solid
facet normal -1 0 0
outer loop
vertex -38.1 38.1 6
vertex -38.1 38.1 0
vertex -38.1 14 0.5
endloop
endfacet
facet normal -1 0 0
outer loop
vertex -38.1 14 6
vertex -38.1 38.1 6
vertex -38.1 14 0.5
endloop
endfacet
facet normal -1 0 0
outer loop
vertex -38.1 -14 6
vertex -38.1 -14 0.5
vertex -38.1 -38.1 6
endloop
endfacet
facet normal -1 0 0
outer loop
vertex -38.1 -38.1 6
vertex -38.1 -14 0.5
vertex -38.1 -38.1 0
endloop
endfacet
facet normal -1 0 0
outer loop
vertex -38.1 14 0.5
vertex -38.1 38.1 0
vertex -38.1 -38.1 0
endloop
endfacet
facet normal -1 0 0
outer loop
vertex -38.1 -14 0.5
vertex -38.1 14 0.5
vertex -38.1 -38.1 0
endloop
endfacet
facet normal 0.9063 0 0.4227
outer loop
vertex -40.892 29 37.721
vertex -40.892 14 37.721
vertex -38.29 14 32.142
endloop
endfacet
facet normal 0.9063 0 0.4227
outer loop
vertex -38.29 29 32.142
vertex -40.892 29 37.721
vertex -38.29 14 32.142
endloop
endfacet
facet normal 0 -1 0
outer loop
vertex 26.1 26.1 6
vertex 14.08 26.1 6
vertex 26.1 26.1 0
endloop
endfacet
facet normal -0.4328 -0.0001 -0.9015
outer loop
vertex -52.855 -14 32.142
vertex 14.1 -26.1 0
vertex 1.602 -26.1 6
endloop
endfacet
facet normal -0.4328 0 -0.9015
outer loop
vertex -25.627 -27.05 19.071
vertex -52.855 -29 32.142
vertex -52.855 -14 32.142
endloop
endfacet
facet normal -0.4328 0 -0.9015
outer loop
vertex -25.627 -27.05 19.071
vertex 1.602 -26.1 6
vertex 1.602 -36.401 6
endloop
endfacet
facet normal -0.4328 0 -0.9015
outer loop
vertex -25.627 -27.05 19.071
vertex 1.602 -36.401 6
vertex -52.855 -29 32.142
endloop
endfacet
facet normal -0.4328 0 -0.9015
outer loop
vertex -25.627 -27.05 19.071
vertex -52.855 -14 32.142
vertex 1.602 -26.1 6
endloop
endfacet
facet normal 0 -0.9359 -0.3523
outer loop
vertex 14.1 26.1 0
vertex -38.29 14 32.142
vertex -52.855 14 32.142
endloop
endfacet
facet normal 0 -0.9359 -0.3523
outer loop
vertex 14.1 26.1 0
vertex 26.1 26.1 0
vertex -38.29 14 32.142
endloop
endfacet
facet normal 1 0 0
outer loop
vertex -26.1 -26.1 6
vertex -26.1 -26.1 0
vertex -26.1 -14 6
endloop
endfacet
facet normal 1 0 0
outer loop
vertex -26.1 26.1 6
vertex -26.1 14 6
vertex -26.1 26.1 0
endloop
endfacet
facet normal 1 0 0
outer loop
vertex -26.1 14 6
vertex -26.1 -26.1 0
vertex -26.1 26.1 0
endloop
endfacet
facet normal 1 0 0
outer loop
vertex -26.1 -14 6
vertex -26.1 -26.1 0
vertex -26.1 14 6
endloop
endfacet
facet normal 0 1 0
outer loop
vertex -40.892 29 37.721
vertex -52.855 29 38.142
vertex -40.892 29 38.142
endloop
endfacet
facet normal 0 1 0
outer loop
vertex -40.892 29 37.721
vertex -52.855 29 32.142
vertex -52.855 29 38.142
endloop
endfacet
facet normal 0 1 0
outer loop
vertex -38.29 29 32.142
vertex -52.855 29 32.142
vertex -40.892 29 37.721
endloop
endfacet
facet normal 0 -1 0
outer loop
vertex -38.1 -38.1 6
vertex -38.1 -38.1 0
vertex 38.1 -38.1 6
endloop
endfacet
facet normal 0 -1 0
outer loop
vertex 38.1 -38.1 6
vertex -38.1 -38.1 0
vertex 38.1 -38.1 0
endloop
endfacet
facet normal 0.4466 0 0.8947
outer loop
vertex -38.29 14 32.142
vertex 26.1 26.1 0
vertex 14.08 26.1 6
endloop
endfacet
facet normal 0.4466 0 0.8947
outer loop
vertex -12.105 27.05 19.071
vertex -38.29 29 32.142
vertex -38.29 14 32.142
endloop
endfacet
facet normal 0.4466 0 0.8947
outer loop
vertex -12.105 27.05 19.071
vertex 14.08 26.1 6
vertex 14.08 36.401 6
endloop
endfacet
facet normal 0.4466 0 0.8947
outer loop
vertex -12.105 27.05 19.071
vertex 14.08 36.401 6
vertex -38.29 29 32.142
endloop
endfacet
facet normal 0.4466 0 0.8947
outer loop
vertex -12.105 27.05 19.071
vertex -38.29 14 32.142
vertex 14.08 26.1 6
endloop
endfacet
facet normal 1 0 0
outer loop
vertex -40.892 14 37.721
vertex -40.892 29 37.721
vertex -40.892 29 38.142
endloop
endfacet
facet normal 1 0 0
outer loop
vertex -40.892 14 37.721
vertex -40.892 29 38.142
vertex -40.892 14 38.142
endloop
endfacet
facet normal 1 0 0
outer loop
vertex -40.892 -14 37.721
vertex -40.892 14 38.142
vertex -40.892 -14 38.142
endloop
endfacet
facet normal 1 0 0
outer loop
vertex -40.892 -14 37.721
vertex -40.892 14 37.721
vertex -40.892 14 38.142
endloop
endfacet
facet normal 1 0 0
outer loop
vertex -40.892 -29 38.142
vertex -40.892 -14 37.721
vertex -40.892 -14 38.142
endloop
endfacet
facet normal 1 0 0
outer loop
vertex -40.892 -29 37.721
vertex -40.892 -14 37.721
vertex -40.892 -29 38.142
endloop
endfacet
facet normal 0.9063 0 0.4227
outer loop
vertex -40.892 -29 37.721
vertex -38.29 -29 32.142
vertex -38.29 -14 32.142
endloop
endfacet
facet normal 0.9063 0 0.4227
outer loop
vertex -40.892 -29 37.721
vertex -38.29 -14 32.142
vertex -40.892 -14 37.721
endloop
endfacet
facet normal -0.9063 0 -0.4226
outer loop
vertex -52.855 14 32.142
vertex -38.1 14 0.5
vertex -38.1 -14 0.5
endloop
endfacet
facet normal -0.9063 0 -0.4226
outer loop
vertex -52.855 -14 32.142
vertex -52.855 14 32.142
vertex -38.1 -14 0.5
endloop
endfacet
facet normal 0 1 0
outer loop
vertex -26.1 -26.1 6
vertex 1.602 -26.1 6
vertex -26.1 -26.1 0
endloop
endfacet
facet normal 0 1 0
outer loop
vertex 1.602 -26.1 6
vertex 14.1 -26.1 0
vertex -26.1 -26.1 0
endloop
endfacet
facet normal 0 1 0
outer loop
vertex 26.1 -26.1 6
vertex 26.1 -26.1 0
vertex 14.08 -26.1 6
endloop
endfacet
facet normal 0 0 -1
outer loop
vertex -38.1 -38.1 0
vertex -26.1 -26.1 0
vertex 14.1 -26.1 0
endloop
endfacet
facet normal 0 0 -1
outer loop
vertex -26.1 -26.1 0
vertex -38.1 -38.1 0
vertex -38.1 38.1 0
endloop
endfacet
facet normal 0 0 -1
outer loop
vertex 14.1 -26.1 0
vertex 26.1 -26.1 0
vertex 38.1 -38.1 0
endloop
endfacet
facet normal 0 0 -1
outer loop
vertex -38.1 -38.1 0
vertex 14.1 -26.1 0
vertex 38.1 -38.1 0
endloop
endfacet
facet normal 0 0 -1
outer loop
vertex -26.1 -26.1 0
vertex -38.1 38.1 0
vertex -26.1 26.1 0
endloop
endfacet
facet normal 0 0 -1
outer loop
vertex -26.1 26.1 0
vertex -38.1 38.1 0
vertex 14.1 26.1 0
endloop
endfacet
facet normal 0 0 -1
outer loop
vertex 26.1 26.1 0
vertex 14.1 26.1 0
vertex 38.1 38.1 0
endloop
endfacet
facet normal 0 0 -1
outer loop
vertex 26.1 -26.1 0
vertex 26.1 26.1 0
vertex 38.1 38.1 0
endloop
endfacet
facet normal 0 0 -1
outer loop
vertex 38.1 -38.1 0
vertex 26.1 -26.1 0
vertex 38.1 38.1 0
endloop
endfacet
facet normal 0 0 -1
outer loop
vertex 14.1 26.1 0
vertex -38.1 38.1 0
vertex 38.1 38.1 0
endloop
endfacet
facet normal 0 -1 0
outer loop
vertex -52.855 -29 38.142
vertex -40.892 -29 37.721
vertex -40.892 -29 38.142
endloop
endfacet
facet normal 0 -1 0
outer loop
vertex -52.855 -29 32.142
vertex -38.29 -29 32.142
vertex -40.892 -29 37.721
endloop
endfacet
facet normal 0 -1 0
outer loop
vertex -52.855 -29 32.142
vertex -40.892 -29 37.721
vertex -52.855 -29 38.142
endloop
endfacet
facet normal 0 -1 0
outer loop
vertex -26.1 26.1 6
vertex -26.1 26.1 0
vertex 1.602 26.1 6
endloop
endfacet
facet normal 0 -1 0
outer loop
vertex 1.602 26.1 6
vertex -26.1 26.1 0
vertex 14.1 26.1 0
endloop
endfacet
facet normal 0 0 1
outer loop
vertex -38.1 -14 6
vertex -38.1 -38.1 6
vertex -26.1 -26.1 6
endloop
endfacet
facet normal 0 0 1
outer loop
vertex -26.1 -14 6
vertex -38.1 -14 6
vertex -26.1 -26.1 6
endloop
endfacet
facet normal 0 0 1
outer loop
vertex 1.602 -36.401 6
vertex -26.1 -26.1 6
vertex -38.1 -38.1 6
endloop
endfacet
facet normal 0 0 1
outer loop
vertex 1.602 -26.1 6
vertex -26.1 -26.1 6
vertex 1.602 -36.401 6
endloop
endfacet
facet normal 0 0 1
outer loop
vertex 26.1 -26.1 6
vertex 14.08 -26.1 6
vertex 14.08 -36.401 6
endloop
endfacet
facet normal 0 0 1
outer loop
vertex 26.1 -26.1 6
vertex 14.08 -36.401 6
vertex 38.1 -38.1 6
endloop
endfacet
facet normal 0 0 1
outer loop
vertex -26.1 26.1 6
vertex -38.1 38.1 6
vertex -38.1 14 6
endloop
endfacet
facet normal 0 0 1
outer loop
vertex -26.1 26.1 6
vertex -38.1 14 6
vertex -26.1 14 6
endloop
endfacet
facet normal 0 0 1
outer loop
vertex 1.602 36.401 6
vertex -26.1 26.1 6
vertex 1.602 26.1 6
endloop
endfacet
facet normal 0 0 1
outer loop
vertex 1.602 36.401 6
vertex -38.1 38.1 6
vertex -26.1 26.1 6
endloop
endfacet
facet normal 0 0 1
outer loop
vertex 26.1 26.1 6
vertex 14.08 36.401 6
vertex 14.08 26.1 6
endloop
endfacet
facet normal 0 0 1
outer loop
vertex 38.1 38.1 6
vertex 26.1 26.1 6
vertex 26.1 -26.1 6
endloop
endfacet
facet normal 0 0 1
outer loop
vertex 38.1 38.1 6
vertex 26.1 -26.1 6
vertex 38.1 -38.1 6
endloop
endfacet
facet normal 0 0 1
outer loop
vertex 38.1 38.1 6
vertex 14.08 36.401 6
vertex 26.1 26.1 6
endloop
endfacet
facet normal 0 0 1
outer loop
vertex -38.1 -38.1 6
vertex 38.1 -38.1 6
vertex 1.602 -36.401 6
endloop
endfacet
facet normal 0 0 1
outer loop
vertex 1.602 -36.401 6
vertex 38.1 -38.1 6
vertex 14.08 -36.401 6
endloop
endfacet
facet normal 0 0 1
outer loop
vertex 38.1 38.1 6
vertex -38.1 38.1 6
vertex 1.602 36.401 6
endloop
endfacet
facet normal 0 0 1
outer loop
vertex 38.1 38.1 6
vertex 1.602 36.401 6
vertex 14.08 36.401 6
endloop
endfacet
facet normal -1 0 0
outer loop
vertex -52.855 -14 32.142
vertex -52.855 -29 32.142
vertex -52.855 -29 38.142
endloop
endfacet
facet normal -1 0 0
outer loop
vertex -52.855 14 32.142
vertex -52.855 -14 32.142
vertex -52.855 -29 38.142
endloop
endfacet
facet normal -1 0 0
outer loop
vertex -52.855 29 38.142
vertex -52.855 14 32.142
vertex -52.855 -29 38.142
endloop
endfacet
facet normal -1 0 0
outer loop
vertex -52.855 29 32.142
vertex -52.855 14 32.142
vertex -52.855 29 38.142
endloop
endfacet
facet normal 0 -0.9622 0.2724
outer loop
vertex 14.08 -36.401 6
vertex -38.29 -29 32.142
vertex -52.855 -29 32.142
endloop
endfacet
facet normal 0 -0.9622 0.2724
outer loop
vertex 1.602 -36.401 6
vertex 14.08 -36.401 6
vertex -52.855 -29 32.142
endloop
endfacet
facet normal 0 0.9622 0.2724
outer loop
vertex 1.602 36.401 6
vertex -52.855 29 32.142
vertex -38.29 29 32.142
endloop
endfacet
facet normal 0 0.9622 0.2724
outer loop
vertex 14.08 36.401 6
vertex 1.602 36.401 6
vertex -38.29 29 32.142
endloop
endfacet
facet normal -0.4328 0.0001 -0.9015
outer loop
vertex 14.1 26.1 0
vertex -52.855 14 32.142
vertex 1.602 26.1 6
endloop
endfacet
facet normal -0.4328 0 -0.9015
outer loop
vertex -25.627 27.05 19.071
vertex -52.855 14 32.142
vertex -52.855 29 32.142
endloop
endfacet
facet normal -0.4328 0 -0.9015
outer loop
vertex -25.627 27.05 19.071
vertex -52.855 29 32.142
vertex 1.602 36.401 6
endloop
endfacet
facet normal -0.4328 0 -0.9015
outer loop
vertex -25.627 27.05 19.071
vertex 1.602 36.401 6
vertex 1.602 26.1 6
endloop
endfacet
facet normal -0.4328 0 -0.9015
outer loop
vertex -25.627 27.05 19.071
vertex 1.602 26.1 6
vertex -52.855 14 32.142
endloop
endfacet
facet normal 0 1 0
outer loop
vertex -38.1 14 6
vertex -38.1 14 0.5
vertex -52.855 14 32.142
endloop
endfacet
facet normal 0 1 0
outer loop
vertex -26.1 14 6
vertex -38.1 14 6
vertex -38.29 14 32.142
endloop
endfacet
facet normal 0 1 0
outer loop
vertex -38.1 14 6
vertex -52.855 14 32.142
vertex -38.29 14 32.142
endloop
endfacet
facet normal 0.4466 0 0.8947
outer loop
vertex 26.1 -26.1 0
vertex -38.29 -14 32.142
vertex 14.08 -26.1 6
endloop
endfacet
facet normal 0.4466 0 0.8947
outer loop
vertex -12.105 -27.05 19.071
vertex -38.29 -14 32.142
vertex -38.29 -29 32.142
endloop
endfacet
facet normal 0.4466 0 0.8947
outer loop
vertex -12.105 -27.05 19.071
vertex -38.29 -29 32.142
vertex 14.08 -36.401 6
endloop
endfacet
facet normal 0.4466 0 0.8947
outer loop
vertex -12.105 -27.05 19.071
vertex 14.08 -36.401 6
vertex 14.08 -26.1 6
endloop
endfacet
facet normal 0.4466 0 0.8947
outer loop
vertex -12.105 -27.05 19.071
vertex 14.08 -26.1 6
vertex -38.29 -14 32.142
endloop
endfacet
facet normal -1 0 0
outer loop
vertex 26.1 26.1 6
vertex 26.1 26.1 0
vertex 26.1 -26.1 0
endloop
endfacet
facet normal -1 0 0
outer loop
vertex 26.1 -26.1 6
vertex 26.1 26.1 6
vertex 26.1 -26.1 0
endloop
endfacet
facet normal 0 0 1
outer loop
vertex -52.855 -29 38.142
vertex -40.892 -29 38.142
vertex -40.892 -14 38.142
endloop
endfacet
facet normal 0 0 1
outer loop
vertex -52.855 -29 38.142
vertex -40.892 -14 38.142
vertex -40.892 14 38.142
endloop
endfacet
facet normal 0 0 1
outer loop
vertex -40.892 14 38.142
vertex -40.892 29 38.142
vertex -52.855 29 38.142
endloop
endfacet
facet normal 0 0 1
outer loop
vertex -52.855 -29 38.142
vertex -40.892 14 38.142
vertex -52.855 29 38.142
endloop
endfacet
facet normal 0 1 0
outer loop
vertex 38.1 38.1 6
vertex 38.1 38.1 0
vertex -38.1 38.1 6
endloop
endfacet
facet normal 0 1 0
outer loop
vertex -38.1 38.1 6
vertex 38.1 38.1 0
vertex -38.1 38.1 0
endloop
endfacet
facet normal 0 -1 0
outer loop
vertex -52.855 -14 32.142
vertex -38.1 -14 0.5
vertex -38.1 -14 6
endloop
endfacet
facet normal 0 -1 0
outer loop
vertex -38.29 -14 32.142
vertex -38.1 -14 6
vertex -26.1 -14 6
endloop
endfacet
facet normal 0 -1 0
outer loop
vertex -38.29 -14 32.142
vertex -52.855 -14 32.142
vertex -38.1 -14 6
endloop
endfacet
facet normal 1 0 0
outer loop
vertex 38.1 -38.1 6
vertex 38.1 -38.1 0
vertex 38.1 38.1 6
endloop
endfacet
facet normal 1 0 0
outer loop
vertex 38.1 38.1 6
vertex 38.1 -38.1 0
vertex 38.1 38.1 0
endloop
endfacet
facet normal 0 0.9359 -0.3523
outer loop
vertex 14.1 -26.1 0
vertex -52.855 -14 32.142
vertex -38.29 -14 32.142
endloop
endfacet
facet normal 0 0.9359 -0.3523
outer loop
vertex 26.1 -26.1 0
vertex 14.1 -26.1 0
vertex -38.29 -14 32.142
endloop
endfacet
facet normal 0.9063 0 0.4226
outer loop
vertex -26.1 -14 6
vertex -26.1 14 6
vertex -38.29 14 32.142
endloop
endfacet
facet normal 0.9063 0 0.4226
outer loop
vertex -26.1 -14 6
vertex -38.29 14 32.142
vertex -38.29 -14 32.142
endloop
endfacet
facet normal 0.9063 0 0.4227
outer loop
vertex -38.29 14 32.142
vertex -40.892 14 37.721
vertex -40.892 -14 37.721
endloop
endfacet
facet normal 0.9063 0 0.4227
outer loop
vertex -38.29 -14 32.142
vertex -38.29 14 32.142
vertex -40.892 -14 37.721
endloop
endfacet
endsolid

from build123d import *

# Parameters (mm, degrees)
F0_W        = 12
F0_H        = 12
F0_H_2      = 28
F1_DEPTH    = 6
F3_W        = 28
F3_H        = 35
F4_DEPTH    = 13.2
F6_W        = 11.9632627889
F6_H        = 28
F9_DEPTH    = 15
F11_DEPTH   = 15
F12_DEPTH   = 0.42144
F9_FACE_W   = 14.5645885303
F9_FACE_H   = 15
F11_FACE1_W = 14.5645885303
F11_FACE1_H = 15


with BuildPart() as f1:
    # F0 (on Top) → F1 (new body)
    with BuildSketch(Plane.XY):
        Polygon((38.1, -38.1), (38.1, 38.1), (26.1, 38.1), (26.1, 26.1), (26.1, -26.1), (26.1, -38.1), align=None)
        with Locations((20.1, 32.1)):
            Rectangle(F0_W, F0_H)
        Polygon((14.1, 26.1), (14.1, 38.1), (-13.07, 38.1), (-26.1, 38.1), (-26.1, 26.1), (-12.9487672821, 26.1), align=None)
        with Locations((20.1, -32.1)):
            Rectangle(F0_W, F0_H)
        Polygon((-13.07, -38.1), (14.1, -38.1), (14.1, -26.1), (-12.9487672821, -26.1), (-26.1, -26.1), (-26.1, -38.1), align=None)
        Polygon((-26.1, 26.1), (-26.1, 38.1), (-38.1, 38.1), (-38.1, 14), (-26.1, 14), align=None)
        Polygon((-38.1, -38.1), (-26.1, -38.1), (-26.1, -26.1), (-26.1, -14), (-38.1, -14), (-38.1, -20), (-38.1, -23), align=None)
        with Locations((-32.1, 0)):
            Rectangle(F0_W, F0_H_2)
    extrude(amount=F1_DEPTH)

    # F3 (on face) → F4 (join)
    with BuildSketch(Plane(origin=(-19.1402449771, 0, -8.9252428118), x_dir=(0, -1, 0), z_dir=(-0.906307787, 0, -0.4226182617))):
        with Locations((0, 33.9681833537)):
            Rectangle(F3_W, F3_H)
    extrude(amount=F4_DEPTH)

    # F6 (on face) → F7 (join, up to the next surface of F1)
    with BuildSketch(Plane.XY.offset(37.7207725463)):
        with Locations((-46.8732705554, 0)):
            Rectangle(F6_W, F6_H)
    extrude(until=Until.NEXT, dir=(0, 0, -1))

    # F8 (on face) → F9 (join)
    with BuildSketch(Plane(origin=(0, 14, 0), x_dir=(-1, 0, 0), z_dir=(0, 1, 0))):
        Polygon((38.2903134195, 32.1422114913), (52.8549019498, 32.1422114913), (52.8549019498, 37.7207725463), (40.8916391609, 37.7207725463), align=None)
    extrude(amount=F9_DEPTH)

    # F10 (on face) → F11 (join)
    with BuildSketch(Plane.XZ.offset(14)):
        Polygon((-52.8549019498, 37.7207725463), (-52.8549019498, 32.1422114913), (-38.2903134195, 32.1422114913), (-40.8916391609, 37.7207725463), align=None)
    extrude(amount=F11_DEPTH)

    # F12 (add): a face of the model
    f12_faces = [f1.faces().sort_by_distance(p)[0] for p in [
        (-46.8732705554, 0, 37.7207725463),
    ]]
    extrude(f12_faces, amount=F12_DEPTH)

    # F9_face (on face) → F13 section 0
    with BuildSketch(Plane(origin=(-45.5726076847, 21.5, 32.1422114913), x_dir=(1, 0, 0), z_dir=(0, 0, -1))):
        Rectangle(F9_FACE_W, F9_FACE_H)
    # F0 (on Top) → F13 section 1
    with BuildSketch(Plane.XY):
        with Locations((20.1, 32.1)):
            Rectangle(F0_W, F0_H)
    loft()

    # F11_face1 (on face) → F14 section 0
    with BuildSketch(Plane(origin=(-45.5726076847, -21.5, 32.1422114913), x_dir=(1, 0, 0), z_dir=(0, 0, -1))):
        Rectangle(F11_FACE1_W, F11_FACE1_H)
    # F0 (on Top) → F14 section 1
    with BuildSketch(Plane.XY):
        with Locations((20.1, -32.1)):
            Rectangle(F0_W, F0_H)
    loft()


solid = f1.part
